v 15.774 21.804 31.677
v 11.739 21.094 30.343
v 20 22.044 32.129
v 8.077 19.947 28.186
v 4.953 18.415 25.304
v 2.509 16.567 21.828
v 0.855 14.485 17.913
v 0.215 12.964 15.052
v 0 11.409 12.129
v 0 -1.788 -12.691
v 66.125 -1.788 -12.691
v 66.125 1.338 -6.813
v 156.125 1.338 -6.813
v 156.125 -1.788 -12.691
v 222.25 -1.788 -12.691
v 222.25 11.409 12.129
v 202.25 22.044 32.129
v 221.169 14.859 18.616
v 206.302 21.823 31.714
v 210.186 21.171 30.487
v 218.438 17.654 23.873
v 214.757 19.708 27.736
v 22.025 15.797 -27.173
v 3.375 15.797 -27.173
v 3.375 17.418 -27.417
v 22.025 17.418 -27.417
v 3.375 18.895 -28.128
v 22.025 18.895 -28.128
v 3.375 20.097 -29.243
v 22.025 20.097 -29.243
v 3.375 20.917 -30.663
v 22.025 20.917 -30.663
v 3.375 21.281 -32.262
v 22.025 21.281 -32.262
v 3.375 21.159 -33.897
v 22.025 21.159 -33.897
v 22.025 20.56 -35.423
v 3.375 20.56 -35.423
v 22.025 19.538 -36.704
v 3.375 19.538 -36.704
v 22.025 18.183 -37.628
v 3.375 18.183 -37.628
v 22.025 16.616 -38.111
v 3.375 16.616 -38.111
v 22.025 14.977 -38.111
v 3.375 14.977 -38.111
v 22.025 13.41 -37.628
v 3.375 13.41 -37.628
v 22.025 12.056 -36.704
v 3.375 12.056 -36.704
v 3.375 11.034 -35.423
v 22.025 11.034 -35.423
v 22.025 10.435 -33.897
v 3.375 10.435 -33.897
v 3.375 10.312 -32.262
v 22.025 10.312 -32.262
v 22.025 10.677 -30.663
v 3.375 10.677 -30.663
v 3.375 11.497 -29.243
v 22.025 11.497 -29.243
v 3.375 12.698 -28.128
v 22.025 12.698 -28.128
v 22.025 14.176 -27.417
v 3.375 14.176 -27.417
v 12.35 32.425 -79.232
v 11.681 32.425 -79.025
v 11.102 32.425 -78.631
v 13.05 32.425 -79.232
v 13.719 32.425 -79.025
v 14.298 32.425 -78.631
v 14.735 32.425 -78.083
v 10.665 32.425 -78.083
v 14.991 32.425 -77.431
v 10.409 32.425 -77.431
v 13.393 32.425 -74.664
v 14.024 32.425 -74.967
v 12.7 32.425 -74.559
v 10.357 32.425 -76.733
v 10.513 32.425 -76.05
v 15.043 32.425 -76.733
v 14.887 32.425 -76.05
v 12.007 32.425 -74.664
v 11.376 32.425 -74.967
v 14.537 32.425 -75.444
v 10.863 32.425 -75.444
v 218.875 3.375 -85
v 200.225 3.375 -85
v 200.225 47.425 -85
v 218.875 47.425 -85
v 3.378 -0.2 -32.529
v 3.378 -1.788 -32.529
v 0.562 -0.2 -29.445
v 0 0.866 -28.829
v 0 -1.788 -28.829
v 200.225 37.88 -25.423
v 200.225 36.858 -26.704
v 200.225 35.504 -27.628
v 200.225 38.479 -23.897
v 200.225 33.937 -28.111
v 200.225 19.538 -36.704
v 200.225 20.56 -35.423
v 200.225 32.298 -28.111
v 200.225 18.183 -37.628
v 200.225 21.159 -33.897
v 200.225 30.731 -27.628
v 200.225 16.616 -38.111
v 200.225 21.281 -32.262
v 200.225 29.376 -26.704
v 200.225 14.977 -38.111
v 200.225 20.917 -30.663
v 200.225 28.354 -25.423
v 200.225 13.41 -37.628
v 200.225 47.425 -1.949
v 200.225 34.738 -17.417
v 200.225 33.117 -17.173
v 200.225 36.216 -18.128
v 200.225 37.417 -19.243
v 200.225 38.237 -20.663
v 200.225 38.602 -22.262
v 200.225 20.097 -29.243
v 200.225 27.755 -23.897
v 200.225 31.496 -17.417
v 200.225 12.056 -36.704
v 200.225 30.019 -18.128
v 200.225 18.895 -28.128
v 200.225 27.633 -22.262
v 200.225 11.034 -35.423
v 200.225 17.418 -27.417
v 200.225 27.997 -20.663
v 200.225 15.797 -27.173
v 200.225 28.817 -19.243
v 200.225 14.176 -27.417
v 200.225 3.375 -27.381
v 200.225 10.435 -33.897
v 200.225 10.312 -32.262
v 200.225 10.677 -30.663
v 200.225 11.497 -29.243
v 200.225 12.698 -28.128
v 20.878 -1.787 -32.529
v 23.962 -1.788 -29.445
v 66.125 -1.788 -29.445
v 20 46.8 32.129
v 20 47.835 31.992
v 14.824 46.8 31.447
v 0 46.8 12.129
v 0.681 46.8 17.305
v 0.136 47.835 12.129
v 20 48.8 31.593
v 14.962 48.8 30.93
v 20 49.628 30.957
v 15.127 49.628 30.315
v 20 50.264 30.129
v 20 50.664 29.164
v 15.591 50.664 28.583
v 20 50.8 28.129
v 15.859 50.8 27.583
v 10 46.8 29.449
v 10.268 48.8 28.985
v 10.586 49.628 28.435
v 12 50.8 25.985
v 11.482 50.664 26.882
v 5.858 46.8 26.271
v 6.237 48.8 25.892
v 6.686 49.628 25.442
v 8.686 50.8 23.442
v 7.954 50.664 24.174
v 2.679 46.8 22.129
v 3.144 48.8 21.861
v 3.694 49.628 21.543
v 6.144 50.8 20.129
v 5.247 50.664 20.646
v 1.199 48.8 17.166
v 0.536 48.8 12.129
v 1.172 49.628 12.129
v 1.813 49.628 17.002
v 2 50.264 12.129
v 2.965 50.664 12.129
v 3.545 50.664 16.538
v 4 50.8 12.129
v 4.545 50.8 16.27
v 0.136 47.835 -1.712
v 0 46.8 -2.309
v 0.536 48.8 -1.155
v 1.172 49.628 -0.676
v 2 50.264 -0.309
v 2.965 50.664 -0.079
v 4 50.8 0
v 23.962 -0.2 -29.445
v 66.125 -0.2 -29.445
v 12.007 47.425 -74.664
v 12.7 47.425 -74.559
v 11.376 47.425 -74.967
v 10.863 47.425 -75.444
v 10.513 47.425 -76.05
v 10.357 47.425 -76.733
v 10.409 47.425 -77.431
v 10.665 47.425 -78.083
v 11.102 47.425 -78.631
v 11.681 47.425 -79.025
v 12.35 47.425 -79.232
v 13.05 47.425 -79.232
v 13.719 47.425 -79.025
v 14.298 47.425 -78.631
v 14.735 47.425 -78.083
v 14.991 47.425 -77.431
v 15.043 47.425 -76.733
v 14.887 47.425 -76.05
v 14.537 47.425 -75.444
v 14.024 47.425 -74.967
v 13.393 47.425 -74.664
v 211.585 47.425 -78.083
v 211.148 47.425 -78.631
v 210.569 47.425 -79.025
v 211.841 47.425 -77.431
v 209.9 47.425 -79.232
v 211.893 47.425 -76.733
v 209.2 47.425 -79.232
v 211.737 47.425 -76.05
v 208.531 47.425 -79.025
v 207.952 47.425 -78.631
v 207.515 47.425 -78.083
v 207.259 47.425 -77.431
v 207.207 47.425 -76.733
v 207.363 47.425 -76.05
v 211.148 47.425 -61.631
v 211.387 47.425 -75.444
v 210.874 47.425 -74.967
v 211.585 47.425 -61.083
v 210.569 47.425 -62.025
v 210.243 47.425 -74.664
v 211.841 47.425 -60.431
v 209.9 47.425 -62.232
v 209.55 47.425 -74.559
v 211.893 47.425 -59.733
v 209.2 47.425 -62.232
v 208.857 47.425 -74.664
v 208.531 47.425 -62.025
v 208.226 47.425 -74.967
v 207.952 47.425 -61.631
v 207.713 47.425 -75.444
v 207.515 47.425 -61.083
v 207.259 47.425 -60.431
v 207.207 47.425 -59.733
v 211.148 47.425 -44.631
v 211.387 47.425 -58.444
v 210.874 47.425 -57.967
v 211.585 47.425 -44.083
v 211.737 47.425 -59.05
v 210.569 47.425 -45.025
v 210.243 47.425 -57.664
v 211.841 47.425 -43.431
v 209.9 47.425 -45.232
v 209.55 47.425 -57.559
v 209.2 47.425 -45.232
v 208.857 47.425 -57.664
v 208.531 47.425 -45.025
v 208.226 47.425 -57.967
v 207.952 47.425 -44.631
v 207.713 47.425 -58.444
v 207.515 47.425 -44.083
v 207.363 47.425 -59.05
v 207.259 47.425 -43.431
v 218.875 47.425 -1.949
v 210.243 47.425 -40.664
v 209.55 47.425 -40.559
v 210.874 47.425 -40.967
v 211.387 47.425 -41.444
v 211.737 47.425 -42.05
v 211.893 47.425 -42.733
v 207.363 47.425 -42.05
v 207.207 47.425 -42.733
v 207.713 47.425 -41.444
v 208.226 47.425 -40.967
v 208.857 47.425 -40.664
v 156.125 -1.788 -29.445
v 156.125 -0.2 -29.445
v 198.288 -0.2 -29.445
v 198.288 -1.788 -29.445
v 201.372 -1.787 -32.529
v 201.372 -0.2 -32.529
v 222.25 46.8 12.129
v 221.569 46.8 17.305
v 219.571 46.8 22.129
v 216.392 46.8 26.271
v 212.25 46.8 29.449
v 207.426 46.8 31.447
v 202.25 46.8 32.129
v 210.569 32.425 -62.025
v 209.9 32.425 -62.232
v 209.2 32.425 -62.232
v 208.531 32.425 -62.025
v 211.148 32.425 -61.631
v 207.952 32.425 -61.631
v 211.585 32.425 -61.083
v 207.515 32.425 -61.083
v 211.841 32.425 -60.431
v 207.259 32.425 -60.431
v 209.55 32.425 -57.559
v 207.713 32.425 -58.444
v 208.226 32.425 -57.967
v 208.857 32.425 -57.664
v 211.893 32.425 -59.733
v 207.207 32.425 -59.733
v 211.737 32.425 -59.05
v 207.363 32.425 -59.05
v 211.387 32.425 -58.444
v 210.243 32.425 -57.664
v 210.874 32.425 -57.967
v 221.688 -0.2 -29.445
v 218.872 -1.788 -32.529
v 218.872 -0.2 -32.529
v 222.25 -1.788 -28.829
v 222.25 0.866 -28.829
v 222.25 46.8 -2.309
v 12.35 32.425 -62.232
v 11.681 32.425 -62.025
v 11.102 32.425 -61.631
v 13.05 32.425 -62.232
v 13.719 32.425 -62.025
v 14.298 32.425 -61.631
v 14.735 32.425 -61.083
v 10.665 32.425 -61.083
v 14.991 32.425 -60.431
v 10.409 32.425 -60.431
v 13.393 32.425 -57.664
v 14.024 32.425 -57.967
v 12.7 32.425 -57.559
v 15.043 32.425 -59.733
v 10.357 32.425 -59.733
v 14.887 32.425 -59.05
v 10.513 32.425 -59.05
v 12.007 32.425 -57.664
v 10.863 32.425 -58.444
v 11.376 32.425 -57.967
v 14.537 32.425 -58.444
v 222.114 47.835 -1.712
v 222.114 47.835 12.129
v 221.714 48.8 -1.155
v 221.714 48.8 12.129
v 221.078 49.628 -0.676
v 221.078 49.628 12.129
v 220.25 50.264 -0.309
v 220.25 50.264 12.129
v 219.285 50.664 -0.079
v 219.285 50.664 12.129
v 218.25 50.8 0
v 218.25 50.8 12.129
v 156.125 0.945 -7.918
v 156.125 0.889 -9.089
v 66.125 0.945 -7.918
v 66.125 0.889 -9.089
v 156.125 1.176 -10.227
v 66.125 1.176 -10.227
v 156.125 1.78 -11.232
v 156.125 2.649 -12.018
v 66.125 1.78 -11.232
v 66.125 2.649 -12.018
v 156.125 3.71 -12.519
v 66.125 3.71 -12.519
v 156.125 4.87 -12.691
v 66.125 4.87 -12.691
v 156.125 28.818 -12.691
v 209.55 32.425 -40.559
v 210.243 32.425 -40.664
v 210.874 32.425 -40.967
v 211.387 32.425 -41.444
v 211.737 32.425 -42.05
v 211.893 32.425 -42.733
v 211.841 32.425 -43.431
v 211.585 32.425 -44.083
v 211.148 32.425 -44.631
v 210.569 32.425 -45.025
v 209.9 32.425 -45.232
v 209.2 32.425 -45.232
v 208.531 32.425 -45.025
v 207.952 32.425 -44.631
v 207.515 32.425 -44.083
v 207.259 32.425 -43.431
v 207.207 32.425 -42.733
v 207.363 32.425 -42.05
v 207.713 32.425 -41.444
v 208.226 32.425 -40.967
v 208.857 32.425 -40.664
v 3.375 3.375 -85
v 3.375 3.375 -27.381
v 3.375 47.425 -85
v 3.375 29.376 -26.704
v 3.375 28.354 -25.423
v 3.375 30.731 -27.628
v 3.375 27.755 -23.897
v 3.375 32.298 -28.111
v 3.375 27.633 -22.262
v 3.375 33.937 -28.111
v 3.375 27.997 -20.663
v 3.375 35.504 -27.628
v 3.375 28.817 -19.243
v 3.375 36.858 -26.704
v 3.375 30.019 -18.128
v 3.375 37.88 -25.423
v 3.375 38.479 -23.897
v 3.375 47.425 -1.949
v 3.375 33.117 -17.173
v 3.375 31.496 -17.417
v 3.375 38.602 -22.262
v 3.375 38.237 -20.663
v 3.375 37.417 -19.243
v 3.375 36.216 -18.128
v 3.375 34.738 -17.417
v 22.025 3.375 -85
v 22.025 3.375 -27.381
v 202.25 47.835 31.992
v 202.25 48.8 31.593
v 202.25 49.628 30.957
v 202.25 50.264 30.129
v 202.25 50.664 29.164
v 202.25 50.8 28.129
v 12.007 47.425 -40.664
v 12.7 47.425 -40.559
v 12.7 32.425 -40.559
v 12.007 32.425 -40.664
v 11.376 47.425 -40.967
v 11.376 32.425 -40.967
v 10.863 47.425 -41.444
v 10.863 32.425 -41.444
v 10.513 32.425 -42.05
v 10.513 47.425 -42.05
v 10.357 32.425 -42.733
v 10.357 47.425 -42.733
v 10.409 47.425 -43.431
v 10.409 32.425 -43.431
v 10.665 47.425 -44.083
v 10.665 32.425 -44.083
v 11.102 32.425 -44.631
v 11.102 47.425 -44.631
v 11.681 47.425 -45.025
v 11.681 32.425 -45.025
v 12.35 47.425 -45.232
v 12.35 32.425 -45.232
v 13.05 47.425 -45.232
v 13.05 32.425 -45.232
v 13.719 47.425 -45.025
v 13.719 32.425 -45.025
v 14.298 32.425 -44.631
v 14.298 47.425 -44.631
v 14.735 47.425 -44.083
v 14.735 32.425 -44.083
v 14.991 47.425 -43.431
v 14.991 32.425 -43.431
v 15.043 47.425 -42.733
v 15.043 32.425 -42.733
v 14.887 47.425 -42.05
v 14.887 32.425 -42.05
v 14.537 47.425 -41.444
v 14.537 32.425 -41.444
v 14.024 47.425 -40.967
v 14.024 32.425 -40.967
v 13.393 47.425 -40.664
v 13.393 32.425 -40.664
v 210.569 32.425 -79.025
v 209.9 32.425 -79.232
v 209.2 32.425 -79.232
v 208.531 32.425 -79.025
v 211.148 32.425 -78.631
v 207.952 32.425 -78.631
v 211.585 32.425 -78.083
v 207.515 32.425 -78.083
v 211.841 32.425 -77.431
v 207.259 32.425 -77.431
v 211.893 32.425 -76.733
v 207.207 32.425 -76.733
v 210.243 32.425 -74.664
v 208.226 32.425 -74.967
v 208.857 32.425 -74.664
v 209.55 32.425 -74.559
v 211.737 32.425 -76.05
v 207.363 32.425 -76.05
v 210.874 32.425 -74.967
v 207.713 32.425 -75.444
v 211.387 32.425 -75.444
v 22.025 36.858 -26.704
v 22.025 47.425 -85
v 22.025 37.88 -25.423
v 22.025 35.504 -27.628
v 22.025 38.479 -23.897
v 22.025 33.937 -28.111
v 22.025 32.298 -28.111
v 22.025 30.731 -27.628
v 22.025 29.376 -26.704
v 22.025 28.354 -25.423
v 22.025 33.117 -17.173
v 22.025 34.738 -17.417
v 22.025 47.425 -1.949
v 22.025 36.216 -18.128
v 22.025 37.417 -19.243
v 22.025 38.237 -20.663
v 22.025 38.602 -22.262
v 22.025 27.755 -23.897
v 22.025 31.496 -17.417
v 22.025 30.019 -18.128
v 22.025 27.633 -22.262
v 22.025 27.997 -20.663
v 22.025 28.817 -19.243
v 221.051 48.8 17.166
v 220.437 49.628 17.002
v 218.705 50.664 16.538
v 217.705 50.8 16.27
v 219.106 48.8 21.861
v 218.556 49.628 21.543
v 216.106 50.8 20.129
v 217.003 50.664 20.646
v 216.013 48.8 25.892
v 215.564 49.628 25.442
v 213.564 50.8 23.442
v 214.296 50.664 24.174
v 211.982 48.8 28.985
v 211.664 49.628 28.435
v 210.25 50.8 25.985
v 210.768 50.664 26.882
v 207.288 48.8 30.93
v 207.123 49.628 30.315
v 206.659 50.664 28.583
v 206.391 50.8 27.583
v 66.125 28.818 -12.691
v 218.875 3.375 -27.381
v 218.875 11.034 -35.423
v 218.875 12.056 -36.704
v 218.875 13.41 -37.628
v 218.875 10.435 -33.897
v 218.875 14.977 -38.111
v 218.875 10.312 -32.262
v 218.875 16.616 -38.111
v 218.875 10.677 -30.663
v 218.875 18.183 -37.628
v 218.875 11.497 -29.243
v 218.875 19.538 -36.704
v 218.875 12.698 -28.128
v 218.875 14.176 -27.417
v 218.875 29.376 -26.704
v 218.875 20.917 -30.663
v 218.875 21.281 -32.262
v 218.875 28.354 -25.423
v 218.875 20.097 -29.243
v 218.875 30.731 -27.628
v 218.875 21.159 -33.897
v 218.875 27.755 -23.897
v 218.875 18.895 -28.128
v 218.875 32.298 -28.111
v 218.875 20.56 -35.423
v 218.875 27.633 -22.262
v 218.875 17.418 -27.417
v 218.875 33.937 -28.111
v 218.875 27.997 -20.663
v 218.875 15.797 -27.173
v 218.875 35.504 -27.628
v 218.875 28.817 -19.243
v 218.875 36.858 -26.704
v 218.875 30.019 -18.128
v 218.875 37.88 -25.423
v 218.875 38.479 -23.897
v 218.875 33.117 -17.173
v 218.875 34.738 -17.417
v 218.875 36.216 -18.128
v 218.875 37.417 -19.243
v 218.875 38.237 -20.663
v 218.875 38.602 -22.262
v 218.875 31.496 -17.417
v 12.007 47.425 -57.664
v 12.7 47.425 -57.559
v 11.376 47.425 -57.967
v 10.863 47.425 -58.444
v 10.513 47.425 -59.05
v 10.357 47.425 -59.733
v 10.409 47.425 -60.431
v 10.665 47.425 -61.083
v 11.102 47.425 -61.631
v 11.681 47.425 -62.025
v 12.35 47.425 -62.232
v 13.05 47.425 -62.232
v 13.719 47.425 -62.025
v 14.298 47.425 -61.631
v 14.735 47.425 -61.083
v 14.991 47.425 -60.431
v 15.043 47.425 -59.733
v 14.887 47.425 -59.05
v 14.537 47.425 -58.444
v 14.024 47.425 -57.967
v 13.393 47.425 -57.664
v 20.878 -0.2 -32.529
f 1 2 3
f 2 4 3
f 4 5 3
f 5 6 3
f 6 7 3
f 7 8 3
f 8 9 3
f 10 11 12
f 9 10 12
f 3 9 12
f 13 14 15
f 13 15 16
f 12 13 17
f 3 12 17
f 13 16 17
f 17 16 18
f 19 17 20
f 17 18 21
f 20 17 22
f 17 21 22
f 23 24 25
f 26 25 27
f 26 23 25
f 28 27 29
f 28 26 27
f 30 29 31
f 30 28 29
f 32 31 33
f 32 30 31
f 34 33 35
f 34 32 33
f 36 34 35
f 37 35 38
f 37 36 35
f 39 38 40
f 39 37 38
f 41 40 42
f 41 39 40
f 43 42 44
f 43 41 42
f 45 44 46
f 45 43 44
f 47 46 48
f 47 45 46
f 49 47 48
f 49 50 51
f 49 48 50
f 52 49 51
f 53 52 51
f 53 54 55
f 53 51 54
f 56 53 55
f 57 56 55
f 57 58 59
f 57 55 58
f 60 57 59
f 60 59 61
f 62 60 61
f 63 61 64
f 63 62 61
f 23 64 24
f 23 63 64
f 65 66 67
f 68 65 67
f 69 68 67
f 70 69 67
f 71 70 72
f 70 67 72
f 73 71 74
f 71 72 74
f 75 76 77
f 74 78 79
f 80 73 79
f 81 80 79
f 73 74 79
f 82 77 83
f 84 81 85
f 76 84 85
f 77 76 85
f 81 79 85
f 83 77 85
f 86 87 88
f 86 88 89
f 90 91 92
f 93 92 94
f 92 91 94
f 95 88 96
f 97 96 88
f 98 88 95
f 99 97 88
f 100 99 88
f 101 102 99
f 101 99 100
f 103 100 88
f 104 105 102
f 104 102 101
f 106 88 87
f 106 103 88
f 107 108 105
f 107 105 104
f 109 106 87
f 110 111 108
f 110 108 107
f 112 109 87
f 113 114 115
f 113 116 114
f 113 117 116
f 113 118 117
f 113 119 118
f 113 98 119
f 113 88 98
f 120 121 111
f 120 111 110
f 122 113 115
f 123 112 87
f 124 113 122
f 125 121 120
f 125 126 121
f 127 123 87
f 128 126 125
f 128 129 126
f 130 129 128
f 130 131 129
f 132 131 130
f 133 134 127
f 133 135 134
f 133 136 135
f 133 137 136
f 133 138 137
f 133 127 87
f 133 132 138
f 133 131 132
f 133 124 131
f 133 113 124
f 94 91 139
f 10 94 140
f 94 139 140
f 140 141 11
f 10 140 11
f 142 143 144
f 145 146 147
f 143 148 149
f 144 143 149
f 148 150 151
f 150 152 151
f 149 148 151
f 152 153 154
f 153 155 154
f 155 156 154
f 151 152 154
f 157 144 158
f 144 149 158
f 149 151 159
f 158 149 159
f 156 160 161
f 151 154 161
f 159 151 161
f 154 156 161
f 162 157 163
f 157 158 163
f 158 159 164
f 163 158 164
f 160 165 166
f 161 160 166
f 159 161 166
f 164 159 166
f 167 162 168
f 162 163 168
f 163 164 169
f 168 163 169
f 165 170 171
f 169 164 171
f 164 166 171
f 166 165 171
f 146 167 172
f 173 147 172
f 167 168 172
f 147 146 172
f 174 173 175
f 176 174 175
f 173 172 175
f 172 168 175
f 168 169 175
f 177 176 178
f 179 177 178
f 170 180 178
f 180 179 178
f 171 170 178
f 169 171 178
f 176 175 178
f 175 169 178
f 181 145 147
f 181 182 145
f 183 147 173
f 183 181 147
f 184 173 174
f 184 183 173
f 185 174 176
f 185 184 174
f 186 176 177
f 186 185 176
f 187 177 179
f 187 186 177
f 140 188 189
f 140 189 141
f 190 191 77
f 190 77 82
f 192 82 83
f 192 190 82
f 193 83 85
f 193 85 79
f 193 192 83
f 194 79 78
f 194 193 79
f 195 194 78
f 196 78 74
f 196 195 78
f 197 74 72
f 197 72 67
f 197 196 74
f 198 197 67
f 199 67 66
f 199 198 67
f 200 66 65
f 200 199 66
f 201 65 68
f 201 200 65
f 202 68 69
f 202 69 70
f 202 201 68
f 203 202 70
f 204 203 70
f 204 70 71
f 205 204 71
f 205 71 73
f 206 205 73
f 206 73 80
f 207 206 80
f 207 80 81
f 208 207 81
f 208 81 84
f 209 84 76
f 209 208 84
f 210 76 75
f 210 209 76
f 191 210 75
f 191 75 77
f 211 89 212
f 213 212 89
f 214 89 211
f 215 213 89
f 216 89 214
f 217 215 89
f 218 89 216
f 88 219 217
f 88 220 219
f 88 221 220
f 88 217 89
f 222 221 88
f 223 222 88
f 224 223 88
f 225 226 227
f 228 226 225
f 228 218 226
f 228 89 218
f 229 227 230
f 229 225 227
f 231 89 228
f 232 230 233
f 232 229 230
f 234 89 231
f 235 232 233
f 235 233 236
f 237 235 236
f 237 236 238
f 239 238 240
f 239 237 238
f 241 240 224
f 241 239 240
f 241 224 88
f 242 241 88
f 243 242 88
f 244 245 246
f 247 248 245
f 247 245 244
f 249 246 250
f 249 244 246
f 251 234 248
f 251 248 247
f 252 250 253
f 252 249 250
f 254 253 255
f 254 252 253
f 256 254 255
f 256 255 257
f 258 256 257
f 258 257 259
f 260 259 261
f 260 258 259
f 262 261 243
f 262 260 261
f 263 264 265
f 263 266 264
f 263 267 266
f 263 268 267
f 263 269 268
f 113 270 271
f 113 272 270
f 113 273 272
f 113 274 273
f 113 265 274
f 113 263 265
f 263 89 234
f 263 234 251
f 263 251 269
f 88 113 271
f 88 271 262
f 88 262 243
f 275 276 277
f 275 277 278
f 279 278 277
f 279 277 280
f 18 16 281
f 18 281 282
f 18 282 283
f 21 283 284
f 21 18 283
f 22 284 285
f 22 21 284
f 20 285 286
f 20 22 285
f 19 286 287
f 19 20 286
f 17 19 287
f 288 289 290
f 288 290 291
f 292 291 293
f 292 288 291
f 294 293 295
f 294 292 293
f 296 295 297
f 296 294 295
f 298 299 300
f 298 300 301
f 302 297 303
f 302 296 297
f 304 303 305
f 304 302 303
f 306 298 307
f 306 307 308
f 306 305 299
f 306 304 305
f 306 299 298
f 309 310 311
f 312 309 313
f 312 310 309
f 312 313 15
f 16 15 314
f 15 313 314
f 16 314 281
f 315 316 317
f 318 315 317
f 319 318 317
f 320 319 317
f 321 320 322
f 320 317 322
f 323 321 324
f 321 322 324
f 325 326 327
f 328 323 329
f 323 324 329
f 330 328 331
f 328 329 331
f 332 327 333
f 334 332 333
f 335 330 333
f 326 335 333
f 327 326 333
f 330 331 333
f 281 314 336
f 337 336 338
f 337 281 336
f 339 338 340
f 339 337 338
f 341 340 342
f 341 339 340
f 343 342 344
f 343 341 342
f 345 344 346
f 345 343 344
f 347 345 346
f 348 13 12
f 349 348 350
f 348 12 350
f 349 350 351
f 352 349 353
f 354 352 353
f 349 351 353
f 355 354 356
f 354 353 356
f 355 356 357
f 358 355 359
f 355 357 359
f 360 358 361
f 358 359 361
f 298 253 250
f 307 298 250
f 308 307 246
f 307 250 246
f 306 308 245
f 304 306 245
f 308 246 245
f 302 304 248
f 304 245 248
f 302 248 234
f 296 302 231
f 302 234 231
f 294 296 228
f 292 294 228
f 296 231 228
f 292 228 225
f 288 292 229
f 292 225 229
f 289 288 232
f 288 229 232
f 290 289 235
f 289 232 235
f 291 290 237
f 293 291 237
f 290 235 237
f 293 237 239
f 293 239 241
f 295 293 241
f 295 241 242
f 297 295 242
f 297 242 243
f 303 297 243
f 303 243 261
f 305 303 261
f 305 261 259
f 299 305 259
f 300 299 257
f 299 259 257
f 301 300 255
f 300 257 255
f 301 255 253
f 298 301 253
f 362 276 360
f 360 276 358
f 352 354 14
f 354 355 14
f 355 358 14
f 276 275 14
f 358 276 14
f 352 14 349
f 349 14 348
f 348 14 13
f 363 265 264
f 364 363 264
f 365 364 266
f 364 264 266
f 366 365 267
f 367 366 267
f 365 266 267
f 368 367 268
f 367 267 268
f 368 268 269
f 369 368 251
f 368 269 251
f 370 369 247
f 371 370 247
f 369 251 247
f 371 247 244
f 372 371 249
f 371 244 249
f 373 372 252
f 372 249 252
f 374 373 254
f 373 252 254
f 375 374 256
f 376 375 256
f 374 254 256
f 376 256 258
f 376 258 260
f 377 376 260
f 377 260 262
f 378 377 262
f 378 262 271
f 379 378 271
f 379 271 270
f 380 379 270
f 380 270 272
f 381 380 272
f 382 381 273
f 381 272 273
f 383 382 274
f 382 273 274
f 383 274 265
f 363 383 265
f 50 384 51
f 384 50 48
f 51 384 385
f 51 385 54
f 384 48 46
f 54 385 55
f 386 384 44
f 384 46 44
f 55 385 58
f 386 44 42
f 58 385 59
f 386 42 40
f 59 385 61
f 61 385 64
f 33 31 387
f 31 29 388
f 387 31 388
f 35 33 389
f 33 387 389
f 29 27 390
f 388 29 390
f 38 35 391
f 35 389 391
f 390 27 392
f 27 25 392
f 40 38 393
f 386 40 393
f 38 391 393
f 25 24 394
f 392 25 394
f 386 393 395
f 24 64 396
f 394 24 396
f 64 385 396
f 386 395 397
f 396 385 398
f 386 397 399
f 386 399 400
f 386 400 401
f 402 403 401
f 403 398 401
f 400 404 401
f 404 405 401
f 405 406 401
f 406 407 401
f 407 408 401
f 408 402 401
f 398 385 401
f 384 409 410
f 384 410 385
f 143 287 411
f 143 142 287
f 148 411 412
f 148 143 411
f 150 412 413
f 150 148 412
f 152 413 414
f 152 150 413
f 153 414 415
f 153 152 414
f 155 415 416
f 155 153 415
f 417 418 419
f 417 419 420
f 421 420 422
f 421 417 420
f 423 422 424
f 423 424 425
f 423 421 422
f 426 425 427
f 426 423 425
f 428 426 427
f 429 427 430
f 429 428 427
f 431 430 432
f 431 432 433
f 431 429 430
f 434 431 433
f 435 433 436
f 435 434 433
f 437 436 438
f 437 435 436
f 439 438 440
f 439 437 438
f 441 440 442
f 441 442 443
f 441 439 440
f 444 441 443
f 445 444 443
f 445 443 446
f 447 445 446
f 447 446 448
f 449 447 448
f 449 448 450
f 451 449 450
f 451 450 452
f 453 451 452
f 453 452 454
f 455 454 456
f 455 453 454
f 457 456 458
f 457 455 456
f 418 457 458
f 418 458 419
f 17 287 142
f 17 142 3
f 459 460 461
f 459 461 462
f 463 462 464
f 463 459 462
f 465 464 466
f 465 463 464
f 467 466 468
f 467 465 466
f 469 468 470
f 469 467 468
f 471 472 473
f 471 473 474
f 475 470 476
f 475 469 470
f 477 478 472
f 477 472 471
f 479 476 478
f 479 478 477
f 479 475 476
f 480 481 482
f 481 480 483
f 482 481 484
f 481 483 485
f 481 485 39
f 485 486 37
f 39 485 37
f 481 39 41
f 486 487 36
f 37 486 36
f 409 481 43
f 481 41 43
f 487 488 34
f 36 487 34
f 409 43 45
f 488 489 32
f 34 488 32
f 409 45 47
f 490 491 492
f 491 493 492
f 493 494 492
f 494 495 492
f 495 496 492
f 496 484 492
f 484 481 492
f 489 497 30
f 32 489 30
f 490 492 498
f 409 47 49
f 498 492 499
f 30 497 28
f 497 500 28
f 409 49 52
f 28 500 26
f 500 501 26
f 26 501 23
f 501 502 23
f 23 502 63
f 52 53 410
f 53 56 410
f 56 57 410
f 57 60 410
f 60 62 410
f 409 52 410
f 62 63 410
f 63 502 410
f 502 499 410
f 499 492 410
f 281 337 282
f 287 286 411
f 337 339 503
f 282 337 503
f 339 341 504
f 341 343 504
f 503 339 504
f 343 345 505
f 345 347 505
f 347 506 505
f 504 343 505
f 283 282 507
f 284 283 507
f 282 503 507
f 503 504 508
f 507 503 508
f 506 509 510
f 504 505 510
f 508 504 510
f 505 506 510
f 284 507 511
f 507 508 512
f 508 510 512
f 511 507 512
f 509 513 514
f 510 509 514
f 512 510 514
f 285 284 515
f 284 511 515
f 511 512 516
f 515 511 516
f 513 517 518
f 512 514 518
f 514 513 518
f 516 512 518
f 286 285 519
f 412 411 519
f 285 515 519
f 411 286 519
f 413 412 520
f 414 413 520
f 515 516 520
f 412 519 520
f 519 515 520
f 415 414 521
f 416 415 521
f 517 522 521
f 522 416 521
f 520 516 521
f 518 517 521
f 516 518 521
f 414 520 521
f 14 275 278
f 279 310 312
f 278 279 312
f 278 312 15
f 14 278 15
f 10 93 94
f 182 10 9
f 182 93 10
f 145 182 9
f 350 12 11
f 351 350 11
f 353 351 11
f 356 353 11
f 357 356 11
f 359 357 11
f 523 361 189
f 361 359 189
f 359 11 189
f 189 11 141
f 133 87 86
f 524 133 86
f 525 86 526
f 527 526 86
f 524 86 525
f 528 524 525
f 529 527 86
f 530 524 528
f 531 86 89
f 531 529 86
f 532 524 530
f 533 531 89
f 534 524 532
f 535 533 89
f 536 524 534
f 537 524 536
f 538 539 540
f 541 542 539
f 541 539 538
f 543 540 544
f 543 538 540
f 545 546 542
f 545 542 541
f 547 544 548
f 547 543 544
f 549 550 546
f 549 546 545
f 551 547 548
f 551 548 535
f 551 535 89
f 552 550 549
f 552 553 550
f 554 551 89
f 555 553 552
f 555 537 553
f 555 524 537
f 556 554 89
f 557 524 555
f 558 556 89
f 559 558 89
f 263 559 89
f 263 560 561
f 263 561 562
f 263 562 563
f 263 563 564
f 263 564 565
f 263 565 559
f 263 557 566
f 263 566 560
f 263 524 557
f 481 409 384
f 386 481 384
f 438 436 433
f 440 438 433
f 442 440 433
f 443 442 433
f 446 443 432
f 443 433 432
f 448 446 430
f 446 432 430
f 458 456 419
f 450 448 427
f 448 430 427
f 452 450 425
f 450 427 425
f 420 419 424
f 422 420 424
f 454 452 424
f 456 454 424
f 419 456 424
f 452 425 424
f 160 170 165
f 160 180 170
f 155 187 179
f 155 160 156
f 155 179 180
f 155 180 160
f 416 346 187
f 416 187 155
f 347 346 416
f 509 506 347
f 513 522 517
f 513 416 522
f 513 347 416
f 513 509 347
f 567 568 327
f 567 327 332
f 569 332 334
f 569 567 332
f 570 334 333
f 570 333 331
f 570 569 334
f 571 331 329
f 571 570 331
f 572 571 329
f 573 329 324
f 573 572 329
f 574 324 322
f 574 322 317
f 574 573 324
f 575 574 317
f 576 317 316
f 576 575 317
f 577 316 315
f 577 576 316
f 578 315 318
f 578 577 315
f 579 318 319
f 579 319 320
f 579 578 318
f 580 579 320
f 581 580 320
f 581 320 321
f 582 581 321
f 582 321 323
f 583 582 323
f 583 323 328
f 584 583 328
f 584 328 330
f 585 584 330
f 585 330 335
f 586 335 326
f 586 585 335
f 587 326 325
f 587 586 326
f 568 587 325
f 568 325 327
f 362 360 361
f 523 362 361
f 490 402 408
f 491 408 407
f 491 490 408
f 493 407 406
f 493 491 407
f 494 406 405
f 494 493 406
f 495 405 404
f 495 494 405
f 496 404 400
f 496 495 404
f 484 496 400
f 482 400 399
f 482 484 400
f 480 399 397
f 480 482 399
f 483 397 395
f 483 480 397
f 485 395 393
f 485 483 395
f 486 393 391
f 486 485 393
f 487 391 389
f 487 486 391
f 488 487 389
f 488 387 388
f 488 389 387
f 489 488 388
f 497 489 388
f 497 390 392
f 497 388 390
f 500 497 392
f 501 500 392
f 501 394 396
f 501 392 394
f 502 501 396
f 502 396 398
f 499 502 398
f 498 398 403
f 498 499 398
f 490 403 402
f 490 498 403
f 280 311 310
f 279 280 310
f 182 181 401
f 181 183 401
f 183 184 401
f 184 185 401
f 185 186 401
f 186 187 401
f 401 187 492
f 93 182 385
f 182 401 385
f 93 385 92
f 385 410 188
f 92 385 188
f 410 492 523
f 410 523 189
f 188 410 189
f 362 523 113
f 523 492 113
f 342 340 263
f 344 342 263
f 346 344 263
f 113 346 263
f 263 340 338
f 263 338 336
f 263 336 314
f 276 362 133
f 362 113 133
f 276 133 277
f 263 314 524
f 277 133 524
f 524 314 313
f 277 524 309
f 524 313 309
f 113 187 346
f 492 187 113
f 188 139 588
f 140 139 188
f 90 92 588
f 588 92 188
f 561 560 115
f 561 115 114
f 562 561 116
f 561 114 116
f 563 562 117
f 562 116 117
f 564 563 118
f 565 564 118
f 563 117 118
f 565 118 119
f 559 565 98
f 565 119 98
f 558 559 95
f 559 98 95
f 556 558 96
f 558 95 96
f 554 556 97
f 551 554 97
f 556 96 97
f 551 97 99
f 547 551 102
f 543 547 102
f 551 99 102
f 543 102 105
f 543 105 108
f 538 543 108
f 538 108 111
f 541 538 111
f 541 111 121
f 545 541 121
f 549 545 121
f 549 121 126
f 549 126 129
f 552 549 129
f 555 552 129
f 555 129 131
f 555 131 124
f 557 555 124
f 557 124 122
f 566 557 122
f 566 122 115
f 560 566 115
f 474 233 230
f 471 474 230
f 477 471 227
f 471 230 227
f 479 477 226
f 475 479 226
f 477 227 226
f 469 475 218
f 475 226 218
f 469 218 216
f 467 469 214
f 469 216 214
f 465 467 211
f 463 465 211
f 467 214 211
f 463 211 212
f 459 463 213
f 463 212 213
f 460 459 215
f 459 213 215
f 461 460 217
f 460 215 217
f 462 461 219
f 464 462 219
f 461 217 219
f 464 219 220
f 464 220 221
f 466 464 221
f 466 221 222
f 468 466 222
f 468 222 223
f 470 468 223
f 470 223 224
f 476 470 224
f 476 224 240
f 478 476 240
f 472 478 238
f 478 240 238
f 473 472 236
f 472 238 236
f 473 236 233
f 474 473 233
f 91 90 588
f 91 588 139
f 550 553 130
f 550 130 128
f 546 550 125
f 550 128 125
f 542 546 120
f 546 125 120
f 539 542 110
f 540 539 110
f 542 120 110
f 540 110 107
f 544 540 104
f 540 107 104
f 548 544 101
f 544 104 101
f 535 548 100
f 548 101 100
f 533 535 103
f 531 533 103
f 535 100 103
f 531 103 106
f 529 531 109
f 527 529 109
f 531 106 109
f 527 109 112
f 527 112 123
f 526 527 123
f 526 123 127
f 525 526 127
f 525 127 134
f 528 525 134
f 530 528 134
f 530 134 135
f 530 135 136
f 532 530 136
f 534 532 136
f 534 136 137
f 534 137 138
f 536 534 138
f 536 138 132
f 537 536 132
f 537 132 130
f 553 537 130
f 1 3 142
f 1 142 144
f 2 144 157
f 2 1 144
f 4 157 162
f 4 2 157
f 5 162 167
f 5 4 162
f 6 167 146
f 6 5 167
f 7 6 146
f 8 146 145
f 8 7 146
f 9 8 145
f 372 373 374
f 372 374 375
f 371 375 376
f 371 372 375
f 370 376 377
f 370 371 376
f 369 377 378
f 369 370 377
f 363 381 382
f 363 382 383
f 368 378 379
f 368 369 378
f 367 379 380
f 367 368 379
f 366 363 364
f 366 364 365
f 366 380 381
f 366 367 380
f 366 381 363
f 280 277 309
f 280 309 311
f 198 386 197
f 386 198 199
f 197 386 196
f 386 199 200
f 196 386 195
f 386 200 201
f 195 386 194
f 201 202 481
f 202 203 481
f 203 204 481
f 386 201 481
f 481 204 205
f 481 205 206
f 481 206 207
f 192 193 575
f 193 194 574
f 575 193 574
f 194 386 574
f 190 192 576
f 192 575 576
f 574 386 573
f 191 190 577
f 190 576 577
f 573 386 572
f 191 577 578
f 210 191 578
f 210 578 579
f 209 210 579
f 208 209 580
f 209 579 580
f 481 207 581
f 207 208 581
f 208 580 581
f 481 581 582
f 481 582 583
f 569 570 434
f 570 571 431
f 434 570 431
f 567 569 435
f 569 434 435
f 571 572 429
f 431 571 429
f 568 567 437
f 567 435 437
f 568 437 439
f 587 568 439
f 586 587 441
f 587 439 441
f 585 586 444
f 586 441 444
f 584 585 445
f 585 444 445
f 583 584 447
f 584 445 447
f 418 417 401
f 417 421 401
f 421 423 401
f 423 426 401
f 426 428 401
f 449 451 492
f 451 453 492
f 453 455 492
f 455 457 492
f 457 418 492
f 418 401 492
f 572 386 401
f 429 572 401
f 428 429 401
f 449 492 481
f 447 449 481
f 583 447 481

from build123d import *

# Parameters (mm, degrees)
BOSS_EXTRUDE1_DEPTH = 222.25
BOSS_EXTRUDE3_DEPTH = 85
SKETCH15_R          = 2.349500000000014
CUT_EXTRUDE6_DEPTH  = 15
SKETCH16_R          = 5.499999999999996
SKETCH16_R_2        = 5.499999999999989
CUT_EXTRUDE7_DEPTH  = 224.37343312265227
BOSS_EXTRUDE5_DEPTH = 222.25
CUT_EXTRUDE3_DEPTH  = 222.25
BOSS_EXTRUDE6_DEPTH = 222.25
CUT_EXTRUDE4_REACH  = 245.691
SKETCH10_W          = 86.747166
SKETCH10_H          = 3.084529946162071
CHAMFER1_SIZE       = 3.5
CUT_EXTRUDE5_REACH  = 245.691
FILLET1_R           = 4
FILLET2_R           = 20
FILLET3_R           = 4


with BuildPart() as part:
    # Sketch1 → Boss-Extrude1 (new body)
    with BuildSketch(Plane(origin=(0, 0, 0), x_dir=(0, 0, -1), z_dir=(1, 0, 0))):
        Polygon((0, 0), (0, 50.8), (29.32939367483333, 0), align=None)
    extrude(amount=BOSS_EXTRUDE1_DEPTH)

    # Sketch3 → Boss-Extrude3 (add)
    with BuildSketch(Plane.XY):
        Polygon((218.875, 47.425), (200.22500000000002, 47.425), (200.22500000000002, 3.374999999999998), (218.875, 3.375), align=None)
    boss_extrude3 = extrude(amount=-BOSS_EXTRUDE3_DEPTH)

    # Sketch15 → Cut-Extrude6 (cut)
    with BuildSketch(Plane(origin=(0, 47.425, 0), x_dir=(1, 0, 0), z_dir=(0, 1, 0))):
        with Locations(Location((209.55000000000064, 59.90863352220276, 0), (0, 0, 270))):
            Circle(SKETCH15_R)
        with Locations(Location((209.55000000000064, 42.90863352220276, 0), (0, 0, 270))):
            Circle(SKETCH15_R)
        with Locations(Location((209.55000000000064, 76.90863352220276, 0), (0, 0, 270))):
            Circle(SKETCH15_R)
    cut_extrude6 = extrude(amount=-CUT_EXTRUDE6_DEPTH, mode=Mode.SUBTRACT)

    # Sketch16 → Cut-Extrude7 (cut, through all)
    with BuildSketch(Plane.ZY.offset(-200.22500000000002)):
        with Locations((-22.67268904895815, 33.11725062299641)):
            Circle(SKETCH16_R)
        with Locations((-32.67268904895816, 15.796742547307629)):
            Circle(SKETCH16_R_2)
    cut_extrude7 = extrude(amount=-CUT_EXTRUDE7_DEPTH, mode=Mode.SUBTRACT)

    # Mirror1: Boss-Extrude3, Cut-Extrude6, Cut-Extrude7 across plane
    add(boss_extrude3.mirror(Plane.ZY.offset(-111.125)))
    add(cut_extrude6.mirror(Plane.ZY.offset(-111.125)), mode=Mode.SUBTRACT)
    add(cut_extrude7.mirror(Plane.ZY.offset(-111.125)), mode=Mode.SUBTRACT)

    # Sketch7 → Boss-Extrude5 (add)
    with BuildSketch(Plane(origin=(222.25, 0, 0), x_dir=(0, 0, -1), z_dir=(1, 0, 0))):
        Polygon((0, 50.8), (-32.128627, 50.79999999999999), (-32.128626999999994, 22.043620610825506), (9.32939367483333, 0), (29.32939367483333, 0), align=None)
    extrude(amount=-BOSS_EXTRUDE5_DEPTH)

    # Sketch8 → Cut-Extrude3 (cut)
    with BuildSketch(Plane(origin=(222.25, 0, 0), x_dir=(0, 0, -1), z_dir=(1, 0, 0))):
        Polygon((0, 4.960526608591835), (9.32939367483333, 0), (0, 0), align=None)
    extrude(amount=-CUT_EXTRUDE3_DEPTH, mode=Mode.SUBTRACT)

    # Sketch9 → Boss-Extrude6 (add)
    with BuildSketch(Plane(origin=(222.25, 0, 0), x_dir=(0, 0, -1), z_dir=(1, 0, 0))):
        Polygon((32.52939367483333, -1.7875), (12.691192231639896, -1.7875000000000023), (9.32939367483333, 0), (29.32939367483333, 0), (29.44486372867126, -0.2000000000000005), (32.52939367483333, -0.2), align=None)
    extrude(amount=-BOSS_EXTRUDE6_DEPTH)

    # Sketch10 → Cut-Extrude4 (cut, up to next)
    with BuildSketch(Plane.XZ.offset(1.7875000000000039), mode=Mode.PRIVATE) as cut_extrude4_sk1:
        Polygon((218.872166, -32.52939367483333), (222.25, -28.82939367483333), (222.25, -32.52939367483333), align=None)
    cut_extrude4_tool1 = extrude(cut_extrude4_sk1.sketch, amount=-CUT_EXTRUDE4_REACH, mode=Mode.PRIVATE) & part.part
    # Sketch10 → Cut-Extrude4 (cut, up to next)
    with BuildSketch(Plane.XZ.offset(1.7875000000000039), mode=Mode.PRIVATE) as cut_extrude4_sk2:
        with Locations((154.49858300000002, -30.987128701752294)):
            Rectangle(SKETCH10_W, SKETCH10_H)
    cut_extrude4_tool2 = extrude(cut_extrude4_sk2.sketch, amount=-CUT_EXTRUDE4_REACH, mode=Mode.PRIVATE) & part.part
    cut_extrude4_1 = cut_extrude4_tool1.solids().sort_by_distance((221.124055, -1.7875, -31.29606))[0]
    add(cut_extrude4_1, mode=Mode.SUBTRACT)
    cut_extrude4_2 = cut_extrude4_tool2.solids().sort_by_distance((154.498583, -1.7875, -30.987129))[0]
    add(cut_extrude4_2, mode=Mode.SUBTRACT)
    cut_extrude4 = cut_extrude4_1 + cut_extrude4_2  # Cut-Extrude4 as one shape, for the pattern or mirror that repeats it

    # Mirror2: Cut-Extrude4 across plane
    add(cut_extrude4.mirror(Plane.ZY.offset(-111.125)), mode=Mode.SUBTRACT)

    # Chamfer1
    # the kernel refuses this chamfer: 3.5 mm, written as the material it takes off along each edge
    with BuildSketch(Plane(origin=(24.37783399999998, -10.788390457880682, -32.52939367483333), x_dir=(-0.9996219169112968, 0, -0.027495876610586126), z_dir=(0, 1, 1.7e-16))) as chamfer1_piece_1_section:
        Polygon((CHAMFER1_SIZE * 0.999621916911, CHAMFER1_SIZE * 0.0274958766106), (-CHAMFER1_SIZE * 0.0274958766106, CHAMFER1_SIZE * 0.999621916911), (0, 0), align=None)
    chamfer1_piece_1 = extrude(amount=10.588390457880683, mode=Mode.PRIVATE)
    chamfer1_piece_1 = split(chamfer1_piece_1, bisect_by=Plane(origin=(23.984976555626393, -1.314391432651377, -29.444863728671262), z_dir=(0, 1.7e-16, -1)), keep=Keep.TOP, mode=Mode.PRIVATE)
    add(chamfer1_piece_1, mode=Mode.SUBTRACT)
    with BuildSketch(Plane(origin=(197.87216600000002, -10.788390457880718, -32.52939367483333), x_dir=(-0.02749587661059007, 0, 0.9996219169112966), z_dir=(0, 1, 1.7e-16))) as chamfer1_piece_2_section:
        Polygon((CHAMFER1_SIZE * 0.999621916911, CHAMFER1_SIZE * 0.0274958766106), (-CHAMFER1_SIZE * 0.0274958766106, CHAMFER1_SIZE * 0.999621916911), (0, 0), align=None)
    chamfer1_piece_2 = extrude(amount=10.588390457880719, mode=Mode.PRIVATE)
    chamfer1_piece_2 = split(chamfer1_piece_2, bisect_by=Plane(origin=(198.26502344437364, -1.3143914326513721, -29.444863728671262), z_dir=(0, 1.7e-16, -1)), keep=Keep.TOP, mode=Mode.PRIVATE)
    add(chamfer1_piece_2, mode=Mode.SUBTRACT)

    # Cut-Extrude5: up to this plane
    cut_extrude5_end = Plane(origin=(222.25, 50.8, 0), z_dir=(0, -0.5000000000000044, 0.8660254037844362))
    # Sketch11 → Cut-Extrude5 (cut, up to the surface)
    with BuildSketch(Plane.XZ.offset(1.7875000000000039), mode=Mode.PRIVATE) as cut_extrude5_sk1:
        Polygon((66.12499999999999, -29.444863728671255), (156.125, -29.444863728671255), (156.125, -12.691192231639896), (66.12500000000001, -12.691192231639896), align=None)
    cut_extrude5_tool1 = split(extrude(cut_extrude5_sk1.sketch, amount=-CUT_EXTRUDE5_REACH, mode=Mode.PRIVATE), bisect_by=cut_extrude5_end, keep=Keep.BOTH, mode=Mode.PRIVATE)
    add(cut_extrude5_tool1.solids().sort_by_distance((111.125, -1.7875, -21.068028))[0], mode=Mode.SUBTRACT)

    # Fillet1
    fillet1_edges = [part.edges().sort_by_distance(p)[0] for p in [
        (111.125, -1.7875000000000016, -12.691192231639896),
    ]]
    fillet(fillet1_edges, radius=FILLET1_R)

    # Fillet2
    fillet2_edges = [part.edges().sort_by_distance(p)[0] for p in [
        (222.25, 36.42181030541275, 32.128627),
        (0, 36.42181030541275, 32.128627),
    ]]
    fillet(fillet2_edges, radius=FILLET2_R)

    # Fillet3
    fillet3_edges = [part.edges().sort_by_distance(p)[0] for p in [
        (222.25, 50.8, 6.064313500000003),
        (0, 50.8, 6.0643135000000035),
        (111.125, 50.79999999999999, 32.128627),
        (216.39213562373095, 50.8, 26.270762623730953),
        (5.857864376269047, 50.8, 26.27076262373096),
    ]]
    fillet(fillet3_edges, radius=FILLET3_R)


solid = part.part
